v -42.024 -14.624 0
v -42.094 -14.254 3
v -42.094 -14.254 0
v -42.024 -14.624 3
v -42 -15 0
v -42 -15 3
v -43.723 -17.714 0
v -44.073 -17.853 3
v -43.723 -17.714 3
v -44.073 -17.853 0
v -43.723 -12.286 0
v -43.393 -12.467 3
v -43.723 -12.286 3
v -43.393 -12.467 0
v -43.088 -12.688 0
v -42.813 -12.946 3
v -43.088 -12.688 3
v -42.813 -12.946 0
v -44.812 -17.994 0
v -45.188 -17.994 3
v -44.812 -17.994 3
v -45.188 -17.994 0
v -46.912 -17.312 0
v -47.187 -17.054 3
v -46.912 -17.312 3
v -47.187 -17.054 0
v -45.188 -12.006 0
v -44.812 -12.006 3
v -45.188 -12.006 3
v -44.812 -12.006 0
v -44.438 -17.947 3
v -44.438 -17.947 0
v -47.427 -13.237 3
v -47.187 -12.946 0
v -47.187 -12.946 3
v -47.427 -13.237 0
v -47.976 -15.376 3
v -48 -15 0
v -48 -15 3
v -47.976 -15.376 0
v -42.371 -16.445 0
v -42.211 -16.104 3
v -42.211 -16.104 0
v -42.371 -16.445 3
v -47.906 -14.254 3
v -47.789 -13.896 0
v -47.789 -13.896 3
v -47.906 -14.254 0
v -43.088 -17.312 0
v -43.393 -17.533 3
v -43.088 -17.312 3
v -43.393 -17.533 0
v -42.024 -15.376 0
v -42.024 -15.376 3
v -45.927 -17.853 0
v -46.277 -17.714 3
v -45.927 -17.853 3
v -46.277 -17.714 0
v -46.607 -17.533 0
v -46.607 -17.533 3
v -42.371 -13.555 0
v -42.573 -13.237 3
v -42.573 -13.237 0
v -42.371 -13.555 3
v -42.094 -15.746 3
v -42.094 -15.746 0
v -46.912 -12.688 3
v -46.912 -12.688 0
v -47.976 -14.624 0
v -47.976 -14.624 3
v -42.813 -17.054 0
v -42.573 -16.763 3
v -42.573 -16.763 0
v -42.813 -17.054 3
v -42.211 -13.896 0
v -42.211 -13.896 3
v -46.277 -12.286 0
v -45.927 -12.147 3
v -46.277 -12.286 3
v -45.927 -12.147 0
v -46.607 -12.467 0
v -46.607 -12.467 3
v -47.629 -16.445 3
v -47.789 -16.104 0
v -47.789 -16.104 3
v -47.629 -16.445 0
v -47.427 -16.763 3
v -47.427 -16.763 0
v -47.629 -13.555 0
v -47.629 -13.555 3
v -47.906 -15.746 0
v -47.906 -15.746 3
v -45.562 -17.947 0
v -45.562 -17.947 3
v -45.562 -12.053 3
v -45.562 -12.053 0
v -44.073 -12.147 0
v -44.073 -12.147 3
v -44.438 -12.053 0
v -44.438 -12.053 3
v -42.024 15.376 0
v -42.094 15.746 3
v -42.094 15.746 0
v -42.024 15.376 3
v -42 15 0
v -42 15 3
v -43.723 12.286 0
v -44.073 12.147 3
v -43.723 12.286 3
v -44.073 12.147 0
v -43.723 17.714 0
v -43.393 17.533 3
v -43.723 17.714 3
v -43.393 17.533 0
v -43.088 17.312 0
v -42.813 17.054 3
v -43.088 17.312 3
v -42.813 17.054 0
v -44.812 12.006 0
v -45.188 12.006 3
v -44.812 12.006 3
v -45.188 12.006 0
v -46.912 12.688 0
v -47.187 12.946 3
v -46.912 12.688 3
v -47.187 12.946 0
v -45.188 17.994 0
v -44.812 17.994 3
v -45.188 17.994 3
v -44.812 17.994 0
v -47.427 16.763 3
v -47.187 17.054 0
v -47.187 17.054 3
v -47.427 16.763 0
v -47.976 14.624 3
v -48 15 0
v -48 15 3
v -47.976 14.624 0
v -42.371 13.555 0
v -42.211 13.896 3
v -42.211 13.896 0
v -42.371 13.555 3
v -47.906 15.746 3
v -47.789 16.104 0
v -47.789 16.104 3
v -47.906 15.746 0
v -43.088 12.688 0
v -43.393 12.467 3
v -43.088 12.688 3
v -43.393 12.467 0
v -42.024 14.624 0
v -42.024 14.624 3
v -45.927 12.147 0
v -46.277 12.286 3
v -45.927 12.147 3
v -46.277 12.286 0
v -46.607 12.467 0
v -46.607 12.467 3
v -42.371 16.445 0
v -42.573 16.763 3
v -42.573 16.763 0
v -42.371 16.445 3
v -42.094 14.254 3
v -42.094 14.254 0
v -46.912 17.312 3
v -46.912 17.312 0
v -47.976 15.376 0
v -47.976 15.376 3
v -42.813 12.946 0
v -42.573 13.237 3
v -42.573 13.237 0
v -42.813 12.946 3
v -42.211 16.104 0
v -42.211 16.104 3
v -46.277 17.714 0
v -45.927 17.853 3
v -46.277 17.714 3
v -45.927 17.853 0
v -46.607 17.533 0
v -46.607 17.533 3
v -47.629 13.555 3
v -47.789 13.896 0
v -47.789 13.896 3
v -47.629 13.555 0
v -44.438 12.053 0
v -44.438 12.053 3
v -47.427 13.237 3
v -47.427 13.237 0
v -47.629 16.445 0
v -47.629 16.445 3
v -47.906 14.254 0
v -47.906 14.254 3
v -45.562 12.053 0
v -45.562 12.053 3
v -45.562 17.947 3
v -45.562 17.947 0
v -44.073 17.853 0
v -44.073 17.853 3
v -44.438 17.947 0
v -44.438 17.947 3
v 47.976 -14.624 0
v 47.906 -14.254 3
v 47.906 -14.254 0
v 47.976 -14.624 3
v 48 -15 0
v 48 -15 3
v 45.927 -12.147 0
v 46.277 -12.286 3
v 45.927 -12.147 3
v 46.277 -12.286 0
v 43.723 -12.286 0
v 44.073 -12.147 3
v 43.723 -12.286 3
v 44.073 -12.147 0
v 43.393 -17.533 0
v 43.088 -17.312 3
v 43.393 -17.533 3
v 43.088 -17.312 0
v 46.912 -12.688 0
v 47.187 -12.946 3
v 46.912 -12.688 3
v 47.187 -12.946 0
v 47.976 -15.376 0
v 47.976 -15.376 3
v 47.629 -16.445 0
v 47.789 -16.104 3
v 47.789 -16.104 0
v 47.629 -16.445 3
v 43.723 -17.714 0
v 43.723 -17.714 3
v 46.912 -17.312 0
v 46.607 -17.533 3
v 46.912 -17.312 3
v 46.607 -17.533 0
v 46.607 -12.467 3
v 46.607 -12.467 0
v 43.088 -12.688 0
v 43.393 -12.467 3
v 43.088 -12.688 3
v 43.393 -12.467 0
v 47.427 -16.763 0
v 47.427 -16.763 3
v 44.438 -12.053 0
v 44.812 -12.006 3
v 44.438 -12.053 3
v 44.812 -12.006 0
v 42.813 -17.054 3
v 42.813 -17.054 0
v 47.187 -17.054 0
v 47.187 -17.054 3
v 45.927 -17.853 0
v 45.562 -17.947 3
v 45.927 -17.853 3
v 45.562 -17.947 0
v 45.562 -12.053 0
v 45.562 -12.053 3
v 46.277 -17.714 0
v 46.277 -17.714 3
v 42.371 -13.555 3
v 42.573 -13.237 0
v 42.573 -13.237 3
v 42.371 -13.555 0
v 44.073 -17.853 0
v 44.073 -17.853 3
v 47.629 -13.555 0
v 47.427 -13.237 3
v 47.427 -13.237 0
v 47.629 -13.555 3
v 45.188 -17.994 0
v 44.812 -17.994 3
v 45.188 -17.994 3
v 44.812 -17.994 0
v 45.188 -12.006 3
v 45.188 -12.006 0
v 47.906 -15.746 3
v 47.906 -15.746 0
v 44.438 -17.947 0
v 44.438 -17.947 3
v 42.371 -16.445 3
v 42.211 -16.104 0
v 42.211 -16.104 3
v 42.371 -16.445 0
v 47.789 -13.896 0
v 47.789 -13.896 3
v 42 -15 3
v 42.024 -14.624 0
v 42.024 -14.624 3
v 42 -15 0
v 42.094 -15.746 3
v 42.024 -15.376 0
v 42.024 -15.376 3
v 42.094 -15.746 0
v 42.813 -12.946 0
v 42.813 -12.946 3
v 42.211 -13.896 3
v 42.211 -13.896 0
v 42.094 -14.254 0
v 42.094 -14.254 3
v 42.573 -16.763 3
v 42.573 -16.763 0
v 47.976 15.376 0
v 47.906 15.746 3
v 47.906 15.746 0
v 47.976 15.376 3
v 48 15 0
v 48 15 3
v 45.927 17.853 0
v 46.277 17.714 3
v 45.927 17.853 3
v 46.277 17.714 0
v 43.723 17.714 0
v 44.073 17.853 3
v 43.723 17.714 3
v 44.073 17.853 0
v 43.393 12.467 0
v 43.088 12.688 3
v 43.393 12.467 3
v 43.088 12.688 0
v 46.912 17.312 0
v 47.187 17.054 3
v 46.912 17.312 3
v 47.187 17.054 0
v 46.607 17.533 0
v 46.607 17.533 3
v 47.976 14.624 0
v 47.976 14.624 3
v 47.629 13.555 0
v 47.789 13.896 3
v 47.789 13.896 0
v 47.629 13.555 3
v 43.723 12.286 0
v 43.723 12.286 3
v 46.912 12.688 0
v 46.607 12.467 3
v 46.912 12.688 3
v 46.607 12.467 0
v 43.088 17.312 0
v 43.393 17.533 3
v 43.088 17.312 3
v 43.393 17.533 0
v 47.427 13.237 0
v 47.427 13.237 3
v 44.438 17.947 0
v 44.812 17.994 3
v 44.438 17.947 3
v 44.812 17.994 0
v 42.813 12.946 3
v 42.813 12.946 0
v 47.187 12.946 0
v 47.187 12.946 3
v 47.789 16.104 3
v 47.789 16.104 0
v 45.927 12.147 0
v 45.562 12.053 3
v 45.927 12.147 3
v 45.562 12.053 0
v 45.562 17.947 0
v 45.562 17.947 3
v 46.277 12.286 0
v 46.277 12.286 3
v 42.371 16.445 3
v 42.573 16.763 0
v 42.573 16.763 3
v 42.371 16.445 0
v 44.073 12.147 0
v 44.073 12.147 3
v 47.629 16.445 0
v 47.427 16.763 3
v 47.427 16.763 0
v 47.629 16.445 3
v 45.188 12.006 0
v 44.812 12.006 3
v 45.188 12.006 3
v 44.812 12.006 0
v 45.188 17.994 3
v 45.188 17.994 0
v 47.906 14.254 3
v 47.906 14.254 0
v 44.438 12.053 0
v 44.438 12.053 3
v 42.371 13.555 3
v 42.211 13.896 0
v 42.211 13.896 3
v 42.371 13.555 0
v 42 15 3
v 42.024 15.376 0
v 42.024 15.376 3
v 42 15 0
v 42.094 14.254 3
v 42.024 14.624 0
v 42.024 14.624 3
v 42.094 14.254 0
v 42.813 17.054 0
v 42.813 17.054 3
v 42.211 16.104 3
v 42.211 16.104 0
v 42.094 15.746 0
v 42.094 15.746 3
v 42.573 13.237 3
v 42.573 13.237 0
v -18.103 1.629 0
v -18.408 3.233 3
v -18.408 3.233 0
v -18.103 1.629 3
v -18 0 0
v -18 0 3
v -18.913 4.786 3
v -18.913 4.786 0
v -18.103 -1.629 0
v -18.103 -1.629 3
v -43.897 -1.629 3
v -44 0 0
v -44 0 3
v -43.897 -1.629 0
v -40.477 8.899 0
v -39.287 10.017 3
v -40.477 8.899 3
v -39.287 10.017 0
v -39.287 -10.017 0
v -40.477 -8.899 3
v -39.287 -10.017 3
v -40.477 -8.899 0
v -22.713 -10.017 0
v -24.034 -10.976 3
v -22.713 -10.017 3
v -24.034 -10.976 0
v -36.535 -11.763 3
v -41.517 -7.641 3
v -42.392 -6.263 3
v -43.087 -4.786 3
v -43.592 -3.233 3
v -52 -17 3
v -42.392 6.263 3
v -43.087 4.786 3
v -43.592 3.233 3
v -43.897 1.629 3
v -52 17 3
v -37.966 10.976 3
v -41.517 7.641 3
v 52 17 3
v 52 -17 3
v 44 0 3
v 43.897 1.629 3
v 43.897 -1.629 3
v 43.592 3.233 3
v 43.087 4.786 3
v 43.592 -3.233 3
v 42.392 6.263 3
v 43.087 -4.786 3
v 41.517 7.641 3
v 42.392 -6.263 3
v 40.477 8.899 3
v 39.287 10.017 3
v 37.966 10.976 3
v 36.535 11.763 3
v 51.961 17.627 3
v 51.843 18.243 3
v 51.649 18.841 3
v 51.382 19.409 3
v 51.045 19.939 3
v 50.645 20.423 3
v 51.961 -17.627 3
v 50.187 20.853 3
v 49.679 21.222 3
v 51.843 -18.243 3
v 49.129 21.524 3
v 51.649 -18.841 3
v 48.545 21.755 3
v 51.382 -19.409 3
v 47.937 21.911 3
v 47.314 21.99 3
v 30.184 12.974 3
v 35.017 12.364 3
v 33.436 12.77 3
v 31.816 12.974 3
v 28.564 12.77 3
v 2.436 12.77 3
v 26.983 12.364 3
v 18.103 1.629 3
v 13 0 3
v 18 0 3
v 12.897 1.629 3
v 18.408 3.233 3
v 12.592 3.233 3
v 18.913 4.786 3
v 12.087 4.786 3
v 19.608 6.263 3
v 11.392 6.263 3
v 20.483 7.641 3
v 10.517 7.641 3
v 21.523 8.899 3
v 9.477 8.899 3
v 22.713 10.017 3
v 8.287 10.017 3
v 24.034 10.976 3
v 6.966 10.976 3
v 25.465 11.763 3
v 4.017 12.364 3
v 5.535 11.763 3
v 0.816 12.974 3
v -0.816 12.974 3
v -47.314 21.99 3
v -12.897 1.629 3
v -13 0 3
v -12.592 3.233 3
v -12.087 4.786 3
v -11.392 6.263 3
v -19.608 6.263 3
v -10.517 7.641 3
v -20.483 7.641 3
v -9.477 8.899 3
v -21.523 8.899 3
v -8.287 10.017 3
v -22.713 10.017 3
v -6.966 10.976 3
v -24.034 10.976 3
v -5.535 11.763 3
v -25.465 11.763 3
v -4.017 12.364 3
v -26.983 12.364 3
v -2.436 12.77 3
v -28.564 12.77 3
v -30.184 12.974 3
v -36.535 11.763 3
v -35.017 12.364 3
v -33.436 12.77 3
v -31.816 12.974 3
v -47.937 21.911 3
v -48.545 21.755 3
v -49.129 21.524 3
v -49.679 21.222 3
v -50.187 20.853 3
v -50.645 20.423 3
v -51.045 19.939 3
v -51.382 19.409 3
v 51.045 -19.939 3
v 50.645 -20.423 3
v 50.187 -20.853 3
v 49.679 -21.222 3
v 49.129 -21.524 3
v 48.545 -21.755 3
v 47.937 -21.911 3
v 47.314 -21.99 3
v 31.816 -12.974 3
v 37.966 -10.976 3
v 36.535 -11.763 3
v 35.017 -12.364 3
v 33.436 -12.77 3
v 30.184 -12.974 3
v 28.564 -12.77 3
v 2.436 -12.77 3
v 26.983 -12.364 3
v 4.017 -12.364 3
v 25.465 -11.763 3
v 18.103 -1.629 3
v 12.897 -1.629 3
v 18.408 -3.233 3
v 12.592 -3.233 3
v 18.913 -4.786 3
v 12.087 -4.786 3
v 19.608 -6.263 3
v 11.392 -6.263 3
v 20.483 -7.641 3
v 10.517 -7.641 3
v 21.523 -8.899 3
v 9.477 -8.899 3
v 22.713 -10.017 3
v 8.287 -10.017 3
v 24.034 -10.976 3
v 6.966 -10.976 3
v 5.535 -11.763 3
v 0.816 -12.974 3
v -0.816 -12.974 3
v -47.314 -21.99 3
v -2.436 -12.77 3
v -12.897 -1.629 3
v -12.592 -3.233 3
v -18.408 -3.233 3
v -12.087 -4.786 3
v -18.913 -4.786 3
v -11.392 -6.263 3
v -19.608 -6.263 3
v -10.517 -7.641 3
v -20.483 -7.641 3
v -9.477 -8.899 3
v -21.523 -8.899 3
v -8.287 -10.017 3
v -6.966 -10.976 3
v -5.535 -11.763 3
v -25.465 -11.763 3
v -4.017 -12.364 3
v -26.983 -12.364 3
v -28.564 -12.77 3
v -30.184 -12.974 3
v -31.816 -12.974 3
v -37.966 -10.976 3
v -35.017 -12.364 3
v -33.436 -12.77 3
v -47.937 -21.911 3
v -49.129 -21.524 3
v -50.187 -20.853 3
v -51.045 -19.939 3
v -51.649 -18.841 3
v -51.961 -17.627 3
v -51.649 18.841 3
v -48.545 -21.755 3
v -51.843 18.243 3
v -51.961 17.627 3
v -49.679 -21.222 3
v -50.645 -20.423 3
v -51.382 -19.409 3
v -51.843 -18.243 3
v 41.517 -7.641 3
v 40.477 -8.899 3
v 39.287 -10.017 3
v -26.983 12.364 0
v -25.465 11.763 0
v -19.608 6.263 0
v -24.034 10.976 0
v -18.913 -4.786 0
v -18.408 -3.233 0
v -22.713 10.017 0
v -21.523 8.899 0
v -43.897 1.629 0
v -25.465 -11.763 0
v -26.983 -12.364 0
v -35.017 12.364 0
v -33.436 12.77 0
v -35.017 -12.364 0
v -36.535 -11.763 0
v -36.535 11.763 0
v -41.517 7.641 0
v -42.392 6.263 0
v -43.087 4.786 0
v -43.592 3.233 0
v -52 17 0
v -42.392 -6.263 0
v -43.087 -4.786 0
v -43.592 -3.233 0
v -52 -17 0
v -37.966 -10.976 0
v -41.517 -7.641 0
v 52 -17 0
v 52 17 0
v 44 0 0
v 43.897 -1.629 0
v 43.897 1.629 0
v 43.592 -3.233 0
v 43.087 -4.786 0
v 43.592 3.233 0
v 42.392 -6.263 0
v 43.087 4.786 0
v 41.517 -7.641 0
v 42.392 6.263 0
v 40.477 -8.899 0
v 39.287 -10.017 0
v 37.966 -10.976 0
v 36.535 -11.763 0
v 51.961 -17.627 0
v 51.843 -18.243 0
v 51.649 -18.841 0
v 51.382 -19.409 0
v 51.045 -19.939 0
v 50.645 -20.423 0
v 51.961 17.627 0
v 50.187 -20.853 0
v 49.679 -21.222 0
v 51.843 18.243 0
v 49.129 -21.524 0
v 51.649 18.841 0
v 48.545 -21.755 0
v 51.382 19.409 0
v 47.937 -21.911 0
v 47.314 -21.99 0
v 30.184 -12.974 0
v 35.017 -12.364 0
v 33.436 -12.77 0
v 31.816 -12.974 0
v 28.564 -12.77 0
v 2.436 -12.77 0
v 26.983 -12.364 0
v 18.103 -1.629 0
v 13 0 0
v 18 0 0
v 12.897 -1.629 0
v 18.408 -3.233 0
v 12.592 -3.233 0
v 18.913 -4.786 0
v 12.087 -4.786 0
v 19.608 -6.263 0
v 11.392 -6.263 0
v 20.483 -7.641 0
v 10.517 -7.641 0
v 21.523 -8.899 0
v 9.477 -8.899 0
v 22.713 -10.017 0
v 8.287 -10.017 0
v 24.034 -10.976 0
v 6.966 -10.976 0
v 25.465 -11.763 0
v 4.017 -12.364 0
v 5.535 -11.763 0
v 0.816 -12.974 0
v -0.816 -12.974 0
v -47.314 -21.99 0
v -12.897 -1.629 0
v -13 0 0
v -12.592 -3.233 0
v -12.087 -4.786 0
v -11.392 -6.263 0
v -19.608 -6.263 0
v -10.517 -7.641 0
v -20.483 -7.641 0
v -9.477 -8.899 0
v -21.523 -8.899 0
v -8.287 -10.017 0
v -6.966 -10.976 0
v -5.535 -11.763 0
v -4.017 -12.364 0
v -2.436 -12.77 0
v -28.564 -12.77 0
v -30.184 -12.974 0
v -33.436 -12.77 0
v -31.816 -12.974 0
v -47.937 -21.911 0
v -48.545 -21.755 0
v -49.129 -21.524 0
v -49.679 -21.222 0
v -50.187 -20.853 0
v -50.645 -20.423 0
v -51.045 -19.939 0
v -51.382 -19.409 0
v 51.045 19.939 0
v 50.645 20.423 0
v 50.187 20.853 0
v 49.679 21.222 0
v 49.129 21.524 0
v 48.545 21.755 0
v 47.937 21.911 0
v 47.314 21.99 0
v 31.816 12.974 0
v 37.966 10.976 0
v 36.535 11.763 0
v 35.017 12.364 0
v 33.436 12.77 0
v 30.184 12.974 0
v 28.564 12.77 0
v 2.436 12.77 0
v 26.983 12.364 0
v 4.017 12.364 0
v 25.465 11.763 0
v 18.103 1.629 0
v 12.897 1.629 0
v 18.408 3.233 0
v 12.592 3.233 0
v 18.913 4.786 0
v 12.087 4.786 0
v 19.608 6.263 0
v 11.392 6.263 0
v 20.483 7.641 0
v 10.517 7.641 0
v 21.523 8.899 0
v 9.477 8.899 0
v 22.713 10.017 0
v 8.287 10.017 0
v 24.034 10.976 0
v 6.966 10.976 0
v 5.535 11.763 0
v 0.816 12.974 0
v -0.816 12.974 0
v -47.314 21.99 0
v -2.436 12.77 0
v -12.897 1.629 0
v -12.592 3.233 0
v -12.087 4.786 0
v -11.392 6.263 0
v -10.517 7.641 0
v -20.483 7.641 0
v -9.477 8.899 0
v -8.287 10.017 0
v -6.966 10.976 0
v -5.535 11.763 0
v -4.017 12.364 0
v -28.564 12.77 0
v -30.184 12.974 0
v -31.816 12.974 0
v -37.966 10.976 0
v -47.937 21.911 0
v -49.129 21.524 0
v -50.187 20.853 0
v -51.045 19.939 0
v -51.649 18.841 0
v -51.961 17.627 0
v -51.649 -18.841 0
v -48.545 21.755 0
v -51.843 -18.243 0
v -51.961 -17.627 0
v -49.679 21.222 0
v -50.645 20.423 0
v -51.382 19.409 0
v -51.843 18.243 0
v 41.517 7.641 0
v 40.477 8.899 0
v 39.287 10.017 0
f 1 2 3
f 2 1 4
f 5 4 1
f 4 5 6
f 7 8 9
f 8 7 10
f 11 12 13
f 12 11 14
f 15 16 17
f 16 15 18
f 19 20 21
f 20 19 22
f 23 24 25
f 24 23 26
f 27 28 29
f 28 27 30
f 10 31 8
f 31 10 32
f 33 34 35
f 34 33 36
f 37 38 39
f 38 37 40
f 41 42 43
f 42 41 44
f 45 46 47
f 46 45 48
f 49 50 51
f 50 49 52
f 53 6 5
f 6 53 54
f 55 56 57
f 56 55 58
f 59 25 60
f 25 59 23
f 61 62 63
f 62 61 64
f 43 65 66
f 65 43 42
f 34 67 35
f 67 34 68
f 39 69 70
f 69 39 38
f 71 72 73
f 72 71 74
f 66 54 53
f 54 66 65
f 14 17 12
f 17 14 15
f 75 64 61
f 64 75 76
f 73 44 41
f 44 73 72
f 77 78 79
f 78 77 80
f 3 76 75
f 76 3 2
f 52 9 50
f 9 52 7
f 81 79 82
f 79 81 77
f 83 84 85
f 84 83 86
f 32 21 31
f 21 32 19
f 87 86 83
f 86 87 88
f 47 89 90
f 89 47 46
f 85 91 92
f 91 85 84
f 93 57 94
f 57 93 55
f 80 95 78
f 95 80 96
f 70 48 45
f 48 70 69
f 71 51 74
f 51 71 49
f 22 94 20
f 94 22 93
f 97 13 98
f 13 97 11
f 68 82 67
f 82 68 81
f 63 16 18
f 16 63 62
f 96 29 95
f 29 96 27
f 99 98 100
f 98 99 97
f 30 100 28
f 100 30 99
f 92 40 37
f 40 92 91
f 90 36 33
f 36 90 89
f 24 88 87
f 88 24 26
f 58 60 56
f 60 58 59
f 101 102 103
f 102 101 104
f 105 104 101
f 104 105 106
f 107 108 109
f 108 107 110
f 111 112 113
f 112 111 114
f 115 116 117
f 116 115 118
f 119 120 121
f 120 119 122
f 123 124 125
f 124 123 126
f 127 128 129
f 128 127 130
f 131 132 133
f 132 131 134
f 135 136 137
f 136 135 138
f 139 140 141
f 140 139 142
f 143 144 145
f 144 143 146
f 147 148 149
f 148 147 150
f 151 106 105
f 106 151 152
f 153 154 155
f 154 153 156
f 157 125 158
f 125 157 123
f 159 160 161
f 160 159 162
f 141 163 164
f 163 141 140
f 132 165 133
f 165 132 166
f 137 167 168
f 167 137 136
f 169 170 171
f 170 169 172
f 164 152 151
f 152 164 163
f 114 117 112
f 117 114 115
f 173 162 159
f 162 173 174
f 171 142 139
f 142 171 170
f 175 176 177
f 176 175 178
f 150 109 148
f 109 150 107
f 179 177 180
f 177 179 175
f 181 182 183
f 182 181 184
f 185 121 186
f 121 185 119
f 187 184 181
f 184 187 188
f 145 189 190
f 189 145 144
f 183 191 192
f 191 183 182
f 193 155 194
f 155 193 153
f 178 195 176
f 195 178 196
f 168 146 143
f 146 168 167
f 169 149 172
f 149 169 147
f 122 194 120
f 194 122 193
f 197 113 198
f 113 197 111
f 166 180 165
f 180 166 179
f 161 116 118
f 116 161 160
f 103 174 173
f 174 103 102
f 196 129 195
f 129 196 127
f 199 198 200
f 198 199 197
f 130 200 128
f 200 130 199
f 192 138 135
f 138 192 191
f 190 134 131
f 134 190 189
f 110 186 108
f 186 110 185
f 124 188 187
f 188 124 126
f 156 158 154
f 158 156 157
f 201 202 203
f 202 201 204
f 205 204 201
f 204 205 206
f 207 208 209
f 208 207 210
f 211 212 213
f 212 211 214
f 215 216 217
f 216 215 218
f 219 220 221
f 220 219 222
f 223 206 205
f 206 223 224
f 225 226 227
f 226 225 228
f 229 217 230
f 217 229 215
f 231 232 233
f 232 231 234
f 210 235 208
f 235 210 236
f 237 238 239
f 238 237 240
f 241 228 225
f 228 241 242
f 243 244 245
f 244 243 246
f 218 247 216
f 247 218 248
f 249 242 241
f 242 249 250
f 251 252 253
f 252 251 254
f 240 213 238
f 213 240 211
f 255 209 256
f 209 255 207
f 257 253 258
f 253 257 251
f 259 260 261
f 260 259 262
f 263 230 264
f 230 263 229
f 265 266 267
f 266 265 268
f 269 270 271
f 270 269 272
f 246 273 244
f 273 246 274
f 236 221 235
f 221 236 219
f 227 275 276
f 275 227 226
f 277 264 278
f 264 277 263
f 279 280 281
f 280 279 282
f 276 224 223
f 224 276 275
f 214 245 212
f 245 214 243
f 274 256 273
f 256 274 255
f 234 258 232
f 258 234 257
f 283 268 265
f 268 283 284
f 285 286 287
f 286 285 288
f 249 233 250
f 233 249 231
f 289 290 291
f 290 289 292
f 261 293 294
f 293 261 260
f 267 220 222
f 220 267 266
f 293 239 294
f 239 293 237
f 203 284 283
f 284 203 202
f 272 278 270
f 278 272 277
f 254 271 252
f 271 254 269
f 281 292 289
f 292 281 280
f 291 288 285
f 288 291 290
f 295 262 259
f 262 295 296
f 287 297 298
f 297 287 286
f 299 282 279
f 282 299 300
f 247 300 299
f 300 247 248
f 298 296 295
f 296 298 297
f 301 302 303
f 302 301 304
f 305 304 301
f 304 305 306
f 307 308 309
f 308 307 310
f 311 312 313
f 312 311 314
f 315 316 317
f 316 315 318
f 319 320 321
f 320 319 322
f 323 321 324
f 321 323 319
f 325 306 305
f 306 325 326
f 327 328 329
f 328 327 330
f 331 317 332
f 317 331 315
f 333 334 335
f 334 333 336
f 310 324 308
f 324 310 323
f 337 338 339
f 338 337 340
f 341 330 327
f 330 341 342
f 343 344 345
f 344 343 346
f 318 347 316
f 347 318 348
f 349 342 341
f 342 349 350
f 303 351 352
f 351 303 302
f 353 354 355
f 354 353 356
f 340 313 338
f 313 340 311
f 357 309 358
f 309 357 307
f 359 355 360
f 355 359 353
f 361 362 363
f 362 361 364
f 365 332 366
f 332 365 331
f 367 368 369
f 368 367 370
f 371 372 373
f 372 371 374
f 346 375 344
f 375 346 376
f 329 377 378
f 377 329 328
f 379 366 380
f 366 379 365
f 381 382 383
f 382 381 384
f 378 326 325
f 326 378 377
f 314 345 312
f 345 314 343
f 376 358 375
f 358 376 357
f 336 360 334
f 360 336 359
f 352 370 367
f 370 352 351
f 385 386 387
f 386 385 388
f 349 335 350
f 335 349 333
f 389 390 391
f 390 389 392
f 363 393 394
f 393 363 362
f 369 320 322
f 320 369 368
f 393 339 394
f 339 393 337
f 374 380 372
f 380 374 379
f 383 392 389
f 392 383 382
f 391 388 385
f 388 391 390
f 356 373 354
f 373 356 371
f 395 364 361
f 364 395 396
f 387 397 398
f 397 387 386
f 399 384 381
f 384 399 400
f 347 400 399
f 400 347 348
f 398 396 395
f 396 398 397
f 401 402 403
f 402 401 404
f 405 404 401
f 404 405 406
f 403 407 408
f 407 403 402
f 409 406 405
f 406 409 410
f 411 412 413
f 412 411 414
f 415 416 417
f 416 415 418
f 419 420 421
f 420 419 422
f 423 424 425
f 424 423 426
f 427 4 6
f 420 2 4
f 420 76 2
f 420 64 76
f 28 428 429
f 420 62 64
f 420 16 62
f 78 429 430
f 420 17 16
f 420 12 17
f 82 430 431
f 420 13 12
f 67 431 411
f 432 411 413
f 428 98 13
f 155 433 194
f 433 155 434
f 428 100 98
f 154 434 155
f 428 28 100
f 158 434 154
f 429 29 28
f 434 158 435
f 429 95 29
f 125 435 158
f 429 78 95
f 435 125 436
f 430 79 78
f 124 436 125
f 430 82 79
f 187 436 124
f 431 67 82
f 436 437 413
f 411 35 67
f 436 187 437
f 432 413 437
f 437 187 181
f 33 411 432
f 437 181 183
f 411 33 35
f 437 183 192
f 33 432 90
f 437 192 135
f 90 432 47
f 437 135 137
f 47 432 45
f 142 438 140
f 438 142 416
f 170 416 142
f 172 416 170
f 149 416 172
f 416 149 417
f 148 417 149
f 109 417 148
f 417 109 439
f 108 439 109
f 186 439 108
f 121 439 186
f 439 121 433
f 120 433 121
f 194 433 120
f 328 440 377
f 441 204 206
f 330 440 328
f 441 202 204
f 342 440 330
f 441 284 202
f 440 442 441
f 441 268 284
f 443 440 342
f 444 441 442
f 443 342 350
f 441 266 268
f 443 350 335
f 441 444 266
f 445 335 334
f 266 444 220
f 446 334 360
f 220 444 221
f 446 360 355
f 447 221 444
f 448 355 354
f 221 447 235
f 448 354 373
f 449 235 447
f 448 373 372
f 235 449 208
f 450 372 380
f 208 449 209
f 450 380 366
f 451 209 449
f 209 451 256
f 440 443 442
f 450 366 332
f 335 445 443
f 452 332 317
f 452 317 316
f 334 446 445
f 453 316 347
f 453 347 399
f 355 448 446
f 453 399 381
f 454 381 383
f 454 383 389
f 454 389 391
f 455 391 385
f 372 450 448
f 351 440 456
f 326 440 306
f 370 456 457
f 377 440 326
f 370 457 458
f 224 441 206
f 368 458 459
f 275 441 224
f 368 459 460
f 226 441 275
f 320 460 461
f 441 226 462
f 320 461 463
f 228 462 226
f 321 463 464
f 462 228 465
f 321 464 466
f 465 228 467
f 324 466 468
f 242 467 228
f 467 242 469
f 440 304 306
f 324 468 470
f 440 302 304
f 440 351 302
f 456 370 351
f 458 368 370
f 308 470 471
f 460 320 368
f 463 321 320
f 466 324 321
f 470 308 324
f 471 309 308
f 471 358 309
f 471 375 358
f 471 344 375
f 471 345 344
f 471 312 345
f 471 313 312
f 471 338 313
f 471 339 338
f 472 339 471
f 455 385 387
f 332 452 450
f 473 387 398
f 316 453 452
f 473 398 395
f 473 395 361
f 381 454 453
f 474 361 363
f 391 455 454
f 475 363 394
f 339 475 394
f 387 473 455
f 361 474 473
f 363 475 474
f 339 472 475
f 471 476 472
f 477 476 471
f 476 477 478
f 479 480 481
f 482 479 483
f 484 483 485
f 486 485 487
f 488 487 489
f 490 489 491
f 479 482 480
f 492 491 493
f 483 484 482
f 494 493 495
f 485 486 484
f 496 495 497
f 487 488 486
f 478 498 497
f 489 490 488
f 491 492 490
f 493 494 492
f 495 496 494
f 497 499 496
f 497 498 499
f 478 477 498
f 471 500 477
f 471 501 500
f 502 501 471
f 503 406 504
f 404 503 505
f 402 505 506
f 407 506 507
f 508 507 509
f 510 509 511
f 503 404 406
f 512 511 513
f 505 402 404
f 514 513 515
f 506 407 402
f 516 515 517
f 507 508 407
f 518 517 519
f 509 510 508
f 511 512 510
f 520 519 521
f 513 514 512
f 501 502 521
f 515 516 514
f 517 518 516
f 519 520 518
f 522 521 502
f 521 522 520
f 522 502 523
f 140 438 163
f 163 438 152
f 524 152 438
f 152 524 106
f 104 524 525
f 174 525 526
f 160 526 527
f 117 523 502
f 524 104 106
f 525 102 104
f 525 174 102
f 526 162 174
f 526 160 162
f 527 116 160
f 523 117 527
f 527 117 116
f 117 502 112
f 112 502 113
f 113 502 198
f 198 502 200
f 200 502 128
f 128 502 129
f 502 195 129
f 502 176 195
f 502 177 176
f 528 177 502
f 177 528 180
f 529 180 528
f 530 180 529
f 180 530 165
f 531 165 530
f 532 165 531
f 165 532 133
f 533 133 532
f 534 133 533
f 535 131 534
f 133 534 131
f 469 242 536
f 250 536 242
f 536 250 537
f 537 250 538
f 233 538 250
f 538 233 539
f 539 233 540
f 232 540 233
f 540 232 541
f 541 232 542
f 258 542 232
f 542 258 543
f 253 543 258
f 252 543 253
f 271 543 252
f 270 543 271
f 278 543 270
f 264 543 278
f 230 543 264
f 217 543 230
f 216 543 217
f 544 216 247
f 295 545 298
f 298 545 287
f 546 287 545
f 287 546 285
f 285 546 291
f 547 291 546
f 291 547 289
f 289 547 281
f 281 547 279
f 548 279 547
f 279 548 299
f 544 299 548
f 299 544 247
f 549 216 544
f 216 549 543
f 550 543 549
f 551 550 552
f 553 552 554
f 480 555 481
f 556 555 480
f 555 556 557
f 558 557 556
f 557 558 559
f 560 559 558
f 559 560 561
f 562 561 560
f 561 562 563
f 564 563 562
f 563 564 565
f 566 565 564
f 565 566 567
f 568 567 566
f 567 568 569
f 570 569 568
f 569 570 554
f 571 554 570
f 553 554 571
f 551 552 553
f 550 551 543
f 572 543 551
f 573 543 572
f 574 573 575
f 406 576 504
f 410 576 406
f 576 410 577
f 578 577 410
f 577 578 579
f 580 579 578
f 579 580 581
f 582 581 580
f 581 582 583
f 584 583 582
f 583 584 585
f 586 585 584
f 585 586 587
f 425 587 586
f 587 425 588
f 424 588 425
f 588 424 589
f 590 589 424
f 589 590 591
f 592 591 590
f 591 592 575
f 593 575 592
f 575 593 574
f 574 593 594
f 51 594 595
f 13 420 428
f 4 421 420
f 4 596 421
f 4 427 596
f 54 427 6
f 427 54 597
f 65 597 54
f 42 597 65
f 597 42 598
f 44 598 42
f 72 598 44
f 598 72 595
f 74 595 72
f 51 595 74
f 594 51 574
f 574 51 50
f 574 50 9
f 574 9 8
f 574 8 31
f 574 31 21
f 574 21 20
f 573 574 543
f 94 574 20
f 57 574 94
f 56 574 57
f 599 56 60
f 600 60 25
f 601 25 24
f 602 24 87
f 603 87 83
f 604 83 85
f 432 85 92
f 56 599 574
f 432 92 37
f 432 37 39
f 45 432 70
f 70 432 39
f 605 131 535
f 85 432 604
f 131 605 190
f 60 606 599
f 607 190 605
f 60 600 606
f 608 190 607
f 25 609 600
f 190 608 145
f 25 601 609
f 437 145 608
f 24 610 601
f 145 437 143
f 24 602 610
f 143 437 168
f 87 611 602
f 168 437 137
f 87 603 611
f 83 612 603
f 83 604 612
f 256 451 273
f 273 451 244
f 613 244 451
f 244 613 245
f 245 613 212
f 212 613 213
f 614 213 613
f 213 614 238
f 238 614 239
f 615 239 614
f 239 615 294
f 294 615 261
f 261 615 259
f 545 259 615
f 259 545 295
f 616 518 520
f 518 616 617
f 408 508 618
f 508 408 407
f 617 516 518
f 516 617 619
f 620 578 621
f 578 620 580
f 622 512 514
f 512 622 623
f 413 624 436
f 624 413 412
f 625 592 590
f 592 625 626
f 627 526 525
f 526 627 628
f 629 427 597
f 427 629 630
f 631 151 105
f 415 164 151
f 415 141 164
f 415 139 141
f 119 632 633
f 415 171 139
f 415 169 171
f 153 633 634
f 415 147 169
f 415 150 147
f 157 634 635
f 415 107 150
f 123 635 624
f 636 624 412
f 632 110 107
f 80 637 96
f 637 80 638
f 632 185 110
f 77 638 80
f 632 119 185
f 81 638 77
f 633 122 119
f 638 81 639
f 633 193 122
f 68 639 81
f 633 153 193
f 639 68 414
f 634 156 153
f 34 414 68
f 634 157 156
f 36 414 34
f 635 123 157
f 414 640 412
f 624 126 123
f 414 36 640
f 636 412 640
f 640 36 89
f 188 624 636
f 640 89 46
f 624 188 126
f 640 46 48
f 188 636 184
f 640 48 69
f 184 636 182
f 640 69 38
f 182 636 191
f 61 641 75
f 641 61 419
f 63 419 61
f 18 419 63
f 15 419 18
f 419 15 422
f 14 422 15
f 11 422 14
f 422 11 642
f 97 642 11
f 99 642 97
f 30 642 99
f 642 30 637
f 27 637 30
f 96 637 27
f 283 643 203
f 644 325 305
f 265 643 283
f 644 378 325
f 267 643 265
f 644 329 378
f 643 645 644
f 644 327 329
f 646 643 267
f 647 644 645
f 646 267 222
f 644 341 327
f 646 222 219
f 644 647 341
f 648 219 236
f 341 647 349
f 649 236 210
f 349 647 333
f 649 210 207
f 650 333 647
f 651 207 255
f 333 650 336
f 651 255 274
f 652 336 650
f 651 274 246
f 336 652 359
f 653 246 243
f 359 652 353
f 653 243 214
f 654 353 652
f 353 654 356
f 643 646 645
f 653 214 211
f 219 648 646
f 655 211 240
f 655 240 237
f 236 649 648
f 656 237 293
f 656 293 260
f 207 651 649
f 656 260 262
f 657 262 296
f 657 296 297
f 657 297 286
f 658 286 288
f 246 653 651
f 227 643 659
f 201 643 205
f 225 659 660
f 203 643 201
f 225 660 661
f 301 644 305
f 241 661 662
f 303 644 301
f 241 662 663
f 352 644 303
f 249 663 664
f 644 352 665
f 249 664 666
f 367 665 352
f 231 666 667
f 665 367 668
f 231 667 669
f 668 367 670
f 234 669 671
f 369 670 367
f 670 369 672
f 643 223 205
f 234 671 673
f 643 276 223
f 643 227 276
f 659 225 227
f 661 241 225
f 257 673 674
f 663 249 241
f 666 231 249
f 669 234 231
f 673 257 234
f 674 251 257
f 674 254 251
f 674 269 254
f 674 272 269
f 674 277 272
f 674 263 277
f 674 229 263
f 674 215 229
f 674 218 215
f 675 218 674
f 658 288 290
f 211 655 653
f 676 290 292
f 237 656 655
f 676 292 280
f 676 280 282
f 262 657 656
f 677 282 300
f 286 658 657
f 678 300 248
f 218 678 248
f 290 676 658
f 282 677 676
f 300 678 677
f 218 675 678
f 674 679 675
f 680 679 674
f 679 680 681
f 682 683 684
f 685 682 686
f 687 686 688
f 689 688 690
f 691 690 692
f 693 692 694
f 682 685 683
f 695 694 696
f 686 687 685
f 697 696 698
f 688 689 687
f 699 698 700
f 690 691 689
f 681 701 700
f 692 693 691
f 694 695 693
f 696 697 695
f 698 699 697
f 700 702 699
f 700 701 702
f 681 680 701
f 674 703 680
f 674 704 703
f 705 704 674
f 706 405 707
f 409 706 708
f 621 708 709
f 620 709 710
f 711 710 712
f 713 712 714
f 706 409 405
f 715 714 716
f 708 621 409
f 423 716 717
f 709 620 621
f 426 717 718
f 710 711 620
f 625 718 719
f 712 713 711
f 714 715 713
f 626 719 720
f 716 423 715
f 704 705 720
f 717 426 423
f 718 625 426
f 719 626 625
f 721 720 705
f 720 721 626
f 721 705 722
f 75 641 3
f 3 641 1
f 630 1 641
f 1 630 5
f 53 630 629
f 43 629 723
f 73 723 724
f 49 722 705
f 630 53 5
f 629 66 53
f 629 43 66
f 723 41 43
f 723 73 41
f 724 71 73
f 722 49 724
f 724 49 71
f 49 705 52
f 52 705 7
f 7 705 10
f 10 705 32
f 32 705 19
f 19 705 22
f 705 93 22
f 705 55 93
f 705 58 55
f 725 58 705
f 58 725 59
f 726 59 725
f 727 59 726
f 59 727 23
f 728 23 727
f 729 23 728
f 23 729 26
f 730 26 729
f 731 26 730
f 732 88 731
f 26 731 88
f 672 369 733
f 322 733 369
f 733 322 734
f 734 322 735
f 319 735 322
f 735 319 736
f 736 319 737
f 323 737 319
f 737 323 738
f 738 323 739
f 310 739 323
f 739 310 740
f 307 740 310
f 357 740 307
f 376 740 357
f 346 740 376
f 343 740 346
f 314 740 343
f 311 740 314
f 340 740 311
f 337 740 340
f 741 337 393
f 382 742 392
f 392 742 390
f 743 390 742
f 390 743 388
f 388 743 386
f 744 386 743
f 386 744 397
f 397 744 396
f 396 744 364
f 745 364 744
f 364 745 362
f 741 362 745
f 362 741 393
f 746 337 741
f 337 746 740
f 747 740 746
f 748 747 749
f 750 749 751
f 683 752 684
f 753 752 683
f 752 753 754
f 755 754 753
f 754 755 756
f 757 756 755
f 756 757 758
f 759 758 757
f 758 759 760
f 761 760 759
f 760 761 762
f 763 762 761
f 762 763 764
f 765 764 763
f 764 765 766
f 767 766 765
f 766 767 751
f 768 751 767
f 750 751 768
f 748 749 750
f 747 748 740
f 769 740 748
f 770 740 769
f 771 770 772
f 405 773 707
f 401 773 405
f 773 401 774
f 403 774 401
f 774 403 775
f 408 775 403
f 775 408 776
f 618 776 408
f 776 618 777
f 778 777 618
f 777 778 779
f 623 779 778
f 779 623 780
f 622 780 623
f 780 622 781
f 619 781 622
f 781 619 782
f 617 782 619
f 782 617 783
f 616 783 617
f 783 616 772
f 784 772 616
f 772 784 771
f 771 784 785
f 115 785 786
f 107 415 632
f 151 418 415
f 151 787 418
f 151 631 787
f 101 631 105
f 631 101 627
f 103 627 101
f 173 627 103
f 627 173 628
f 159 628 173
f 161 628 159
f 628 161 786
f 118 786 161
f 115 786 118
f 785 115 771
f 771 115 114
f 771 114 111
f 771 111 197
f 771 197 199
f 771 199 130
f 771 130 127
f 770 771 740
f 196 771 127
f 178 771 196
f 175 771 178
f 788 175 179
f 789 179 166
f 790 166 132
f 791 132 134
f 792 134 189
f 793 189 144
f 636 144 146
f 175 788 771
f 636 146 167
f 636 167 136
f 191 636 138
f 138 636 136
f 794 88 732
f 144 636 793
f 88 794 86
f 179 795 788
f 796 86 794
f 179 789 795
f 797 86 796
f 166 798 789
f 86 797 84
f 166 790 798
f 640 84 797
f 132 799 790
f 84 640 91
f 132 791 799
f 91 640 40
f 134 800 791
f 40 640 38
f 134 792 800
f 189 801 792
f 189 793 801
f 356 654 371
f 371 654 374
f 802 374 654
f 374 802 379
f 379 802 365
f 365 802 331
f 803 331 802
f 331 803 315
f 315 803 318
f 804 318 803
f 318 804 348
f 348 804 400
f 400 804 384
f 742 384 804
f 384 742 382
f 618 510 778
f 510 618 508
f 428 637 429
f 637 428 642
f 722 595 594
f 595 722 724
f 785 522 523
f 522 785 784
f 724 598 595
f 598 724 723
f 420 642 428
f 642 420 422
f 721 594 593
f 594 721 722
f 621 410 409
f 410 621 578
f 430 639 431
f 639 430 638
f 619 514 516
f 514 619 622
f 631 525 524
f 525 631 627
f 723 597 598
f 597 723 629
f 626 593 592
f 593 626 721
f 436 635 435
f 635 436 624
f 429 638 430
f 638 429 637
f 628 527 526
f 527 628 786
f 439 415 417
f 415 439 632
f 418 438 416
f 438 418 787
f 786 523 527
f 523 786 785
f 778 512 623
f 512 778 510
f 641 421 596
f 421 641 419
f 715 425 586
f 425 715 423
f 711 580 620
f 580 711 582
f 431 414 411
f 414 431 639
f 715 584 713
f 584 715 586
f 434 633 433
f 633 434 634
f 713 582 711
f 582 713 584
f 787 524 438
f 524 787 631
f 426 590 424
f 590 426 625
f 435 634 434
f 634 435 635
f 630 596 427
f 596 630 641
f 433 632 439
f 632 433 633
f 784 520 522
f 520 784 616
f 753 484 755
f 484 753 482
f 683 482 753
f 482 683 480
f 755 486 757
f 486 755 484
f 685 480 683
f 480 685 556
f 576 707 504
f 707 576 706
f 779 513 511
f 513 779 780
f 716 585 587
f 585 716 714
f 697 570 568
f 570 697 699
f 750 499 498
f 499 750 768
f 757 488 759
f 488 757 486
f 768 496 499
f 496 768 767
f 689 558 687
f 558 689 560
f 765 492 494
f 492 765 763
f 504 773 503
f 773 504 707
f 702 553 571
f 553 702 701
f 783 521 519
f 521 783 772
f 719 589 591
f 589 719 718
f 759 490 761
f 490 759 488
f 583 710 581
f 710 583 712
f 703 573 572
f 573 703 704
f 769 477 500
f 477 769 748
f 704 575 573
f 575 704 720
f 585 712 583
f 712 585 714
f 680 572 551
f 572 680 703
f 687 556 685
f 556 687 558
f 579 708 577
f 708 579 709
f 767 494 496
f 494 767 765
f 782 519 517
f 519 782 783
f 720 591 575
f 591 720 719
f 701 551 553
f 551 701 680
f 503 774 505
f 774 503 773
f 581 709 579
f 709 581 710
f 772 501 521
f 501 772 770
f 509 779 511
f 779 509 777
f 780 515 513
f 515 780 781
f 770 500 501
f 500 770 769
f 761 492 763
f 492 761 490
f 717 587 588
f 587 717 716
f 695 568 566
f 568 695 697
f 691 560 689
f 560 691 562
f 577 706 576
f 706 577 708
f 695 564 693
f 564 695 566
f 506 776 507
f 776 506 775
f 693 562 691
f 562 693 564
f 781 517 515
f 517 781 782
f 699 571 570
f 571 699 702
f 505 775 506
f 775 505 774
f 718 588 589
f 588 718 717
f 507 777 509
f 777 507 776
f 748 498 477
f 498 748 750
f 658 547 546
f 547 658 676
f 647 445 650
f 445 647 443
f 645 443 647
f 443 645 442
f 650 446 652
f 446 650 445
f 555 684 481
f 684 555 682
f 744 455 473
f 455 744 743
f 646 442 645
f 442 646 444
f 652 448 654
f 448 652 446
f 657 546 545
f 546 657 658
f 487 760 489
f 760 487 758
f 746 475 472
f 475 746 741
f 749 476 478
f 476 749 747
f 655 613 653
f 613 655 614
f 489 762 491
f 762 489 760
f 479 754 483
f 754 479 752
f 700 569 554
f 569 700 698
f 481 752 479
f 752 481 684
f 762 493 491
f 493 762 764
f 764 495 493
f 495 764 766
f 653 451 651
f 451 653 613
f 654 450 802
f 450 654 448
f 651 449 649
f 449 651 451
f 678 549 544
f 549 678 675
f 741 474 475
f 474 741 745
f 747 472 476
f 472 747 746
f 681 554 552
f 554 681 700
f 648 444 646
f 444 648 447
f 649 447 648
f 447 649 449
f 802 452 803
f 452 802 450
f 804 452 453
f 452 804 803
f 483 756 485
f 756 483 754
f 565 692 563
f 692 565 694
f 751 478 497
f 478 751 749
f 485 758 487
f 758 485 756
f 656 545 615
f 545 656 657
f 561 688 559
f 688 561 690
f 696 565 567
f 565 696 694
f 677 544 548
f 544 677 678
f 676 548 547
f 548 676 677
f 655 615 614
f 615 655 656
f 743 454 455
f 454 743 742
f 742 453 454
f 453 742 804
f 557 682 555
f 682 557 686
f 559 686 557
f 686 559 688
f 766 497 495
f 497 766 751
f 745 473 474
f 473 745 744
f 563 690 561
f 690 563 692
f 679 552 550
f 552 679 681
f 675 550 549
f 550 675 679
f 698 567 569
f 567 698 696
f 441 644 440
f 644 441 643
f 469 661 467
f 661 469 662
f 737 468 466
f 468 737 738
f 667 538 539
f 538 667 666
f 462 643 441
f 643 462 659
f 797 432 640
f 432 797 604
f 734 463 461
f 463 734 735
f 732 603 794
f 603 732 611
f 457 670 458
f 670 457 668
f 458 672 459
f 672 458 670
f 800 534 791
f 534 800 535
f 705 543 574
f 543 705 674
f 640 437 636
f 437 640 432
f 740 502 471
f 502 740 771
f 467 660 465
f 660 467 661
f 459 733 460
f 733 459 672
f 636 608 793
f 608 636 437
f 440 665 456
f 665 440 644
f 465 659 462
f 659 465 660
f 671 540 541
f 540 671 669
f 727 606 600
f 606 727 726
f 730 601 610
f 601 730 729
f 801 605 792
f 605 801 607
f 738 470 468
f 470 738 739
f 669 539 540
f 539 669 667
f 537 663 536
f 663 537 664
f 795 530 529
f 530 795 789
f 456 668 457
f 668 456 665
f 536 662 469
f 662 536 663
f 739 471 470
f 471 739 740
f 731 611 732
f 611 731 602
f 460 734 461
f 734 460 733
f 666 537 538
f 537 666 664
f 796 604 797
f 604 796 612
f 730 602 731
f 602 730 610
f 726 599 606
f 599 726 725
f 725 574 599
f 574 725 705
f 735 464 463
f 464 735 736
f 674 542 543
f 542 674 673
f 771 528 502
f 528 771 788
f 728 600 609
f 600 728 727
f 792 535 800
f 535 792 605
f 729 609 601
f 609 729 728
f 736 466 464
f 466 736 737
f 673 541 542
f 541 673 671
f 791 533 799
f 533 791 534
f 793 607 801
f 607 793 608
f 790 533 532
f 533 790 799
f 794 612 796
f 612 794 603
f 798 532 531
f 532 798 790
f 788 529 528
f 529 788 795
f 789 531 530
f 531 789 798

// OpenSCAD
$fn = 50;


difference() {
	union() {
		hull() {
			translate(v = [-47.0000000000, 17.0000000000, 0]) {
				cylinder(h = 3, r = 5);
			}
			translate(v = [47.0000000000, 17.0000000000, 0]) {
				cylinder(h = 3, r = 5);
			}
			translate(v = [-47.0000000000, -17.0000000000, 0]) {
				cylinder(h = 3, r = 5);
			}
			translate(v = [47.0000000000, -17.0000000000, 0]) {
				cylinder(h = 3, r = 5);
			}
		}
	}
	union() {
		#translate(v = [-45.0000000000, -15.0000000000, -100.0000000000]) {
			cylinder(h = 200, r = 3.0000000000);
		}
		#translate(v = [-45.0000000000, 15.0000000000, -100.0000000000]) {
			cylinder(h = 200, r = 3.0000000000);
		}
		#translate(v = [45.0000000000, -15.0000000000, -100.0000000000]) {
			cylinder(h = 200, r = 3.0000000000);
		}
		#translate(v = [45.0000000000, 15.0000000000, -100.0000000000]) {
			cylinder(h = 200, r = 3.0000000000);
		}
		#translate(v = [-31.0000000000, 0, 0]) {
			cylinder(h = 3, r = 13.0000000000);
		}
		#cylinder(h = 3, r = 13.0000000000);
		#translate(v = [31.0000000000, 0, 0]) {
			cylinder(h = 3, r = 13.0000000000);
		}
	}
}
